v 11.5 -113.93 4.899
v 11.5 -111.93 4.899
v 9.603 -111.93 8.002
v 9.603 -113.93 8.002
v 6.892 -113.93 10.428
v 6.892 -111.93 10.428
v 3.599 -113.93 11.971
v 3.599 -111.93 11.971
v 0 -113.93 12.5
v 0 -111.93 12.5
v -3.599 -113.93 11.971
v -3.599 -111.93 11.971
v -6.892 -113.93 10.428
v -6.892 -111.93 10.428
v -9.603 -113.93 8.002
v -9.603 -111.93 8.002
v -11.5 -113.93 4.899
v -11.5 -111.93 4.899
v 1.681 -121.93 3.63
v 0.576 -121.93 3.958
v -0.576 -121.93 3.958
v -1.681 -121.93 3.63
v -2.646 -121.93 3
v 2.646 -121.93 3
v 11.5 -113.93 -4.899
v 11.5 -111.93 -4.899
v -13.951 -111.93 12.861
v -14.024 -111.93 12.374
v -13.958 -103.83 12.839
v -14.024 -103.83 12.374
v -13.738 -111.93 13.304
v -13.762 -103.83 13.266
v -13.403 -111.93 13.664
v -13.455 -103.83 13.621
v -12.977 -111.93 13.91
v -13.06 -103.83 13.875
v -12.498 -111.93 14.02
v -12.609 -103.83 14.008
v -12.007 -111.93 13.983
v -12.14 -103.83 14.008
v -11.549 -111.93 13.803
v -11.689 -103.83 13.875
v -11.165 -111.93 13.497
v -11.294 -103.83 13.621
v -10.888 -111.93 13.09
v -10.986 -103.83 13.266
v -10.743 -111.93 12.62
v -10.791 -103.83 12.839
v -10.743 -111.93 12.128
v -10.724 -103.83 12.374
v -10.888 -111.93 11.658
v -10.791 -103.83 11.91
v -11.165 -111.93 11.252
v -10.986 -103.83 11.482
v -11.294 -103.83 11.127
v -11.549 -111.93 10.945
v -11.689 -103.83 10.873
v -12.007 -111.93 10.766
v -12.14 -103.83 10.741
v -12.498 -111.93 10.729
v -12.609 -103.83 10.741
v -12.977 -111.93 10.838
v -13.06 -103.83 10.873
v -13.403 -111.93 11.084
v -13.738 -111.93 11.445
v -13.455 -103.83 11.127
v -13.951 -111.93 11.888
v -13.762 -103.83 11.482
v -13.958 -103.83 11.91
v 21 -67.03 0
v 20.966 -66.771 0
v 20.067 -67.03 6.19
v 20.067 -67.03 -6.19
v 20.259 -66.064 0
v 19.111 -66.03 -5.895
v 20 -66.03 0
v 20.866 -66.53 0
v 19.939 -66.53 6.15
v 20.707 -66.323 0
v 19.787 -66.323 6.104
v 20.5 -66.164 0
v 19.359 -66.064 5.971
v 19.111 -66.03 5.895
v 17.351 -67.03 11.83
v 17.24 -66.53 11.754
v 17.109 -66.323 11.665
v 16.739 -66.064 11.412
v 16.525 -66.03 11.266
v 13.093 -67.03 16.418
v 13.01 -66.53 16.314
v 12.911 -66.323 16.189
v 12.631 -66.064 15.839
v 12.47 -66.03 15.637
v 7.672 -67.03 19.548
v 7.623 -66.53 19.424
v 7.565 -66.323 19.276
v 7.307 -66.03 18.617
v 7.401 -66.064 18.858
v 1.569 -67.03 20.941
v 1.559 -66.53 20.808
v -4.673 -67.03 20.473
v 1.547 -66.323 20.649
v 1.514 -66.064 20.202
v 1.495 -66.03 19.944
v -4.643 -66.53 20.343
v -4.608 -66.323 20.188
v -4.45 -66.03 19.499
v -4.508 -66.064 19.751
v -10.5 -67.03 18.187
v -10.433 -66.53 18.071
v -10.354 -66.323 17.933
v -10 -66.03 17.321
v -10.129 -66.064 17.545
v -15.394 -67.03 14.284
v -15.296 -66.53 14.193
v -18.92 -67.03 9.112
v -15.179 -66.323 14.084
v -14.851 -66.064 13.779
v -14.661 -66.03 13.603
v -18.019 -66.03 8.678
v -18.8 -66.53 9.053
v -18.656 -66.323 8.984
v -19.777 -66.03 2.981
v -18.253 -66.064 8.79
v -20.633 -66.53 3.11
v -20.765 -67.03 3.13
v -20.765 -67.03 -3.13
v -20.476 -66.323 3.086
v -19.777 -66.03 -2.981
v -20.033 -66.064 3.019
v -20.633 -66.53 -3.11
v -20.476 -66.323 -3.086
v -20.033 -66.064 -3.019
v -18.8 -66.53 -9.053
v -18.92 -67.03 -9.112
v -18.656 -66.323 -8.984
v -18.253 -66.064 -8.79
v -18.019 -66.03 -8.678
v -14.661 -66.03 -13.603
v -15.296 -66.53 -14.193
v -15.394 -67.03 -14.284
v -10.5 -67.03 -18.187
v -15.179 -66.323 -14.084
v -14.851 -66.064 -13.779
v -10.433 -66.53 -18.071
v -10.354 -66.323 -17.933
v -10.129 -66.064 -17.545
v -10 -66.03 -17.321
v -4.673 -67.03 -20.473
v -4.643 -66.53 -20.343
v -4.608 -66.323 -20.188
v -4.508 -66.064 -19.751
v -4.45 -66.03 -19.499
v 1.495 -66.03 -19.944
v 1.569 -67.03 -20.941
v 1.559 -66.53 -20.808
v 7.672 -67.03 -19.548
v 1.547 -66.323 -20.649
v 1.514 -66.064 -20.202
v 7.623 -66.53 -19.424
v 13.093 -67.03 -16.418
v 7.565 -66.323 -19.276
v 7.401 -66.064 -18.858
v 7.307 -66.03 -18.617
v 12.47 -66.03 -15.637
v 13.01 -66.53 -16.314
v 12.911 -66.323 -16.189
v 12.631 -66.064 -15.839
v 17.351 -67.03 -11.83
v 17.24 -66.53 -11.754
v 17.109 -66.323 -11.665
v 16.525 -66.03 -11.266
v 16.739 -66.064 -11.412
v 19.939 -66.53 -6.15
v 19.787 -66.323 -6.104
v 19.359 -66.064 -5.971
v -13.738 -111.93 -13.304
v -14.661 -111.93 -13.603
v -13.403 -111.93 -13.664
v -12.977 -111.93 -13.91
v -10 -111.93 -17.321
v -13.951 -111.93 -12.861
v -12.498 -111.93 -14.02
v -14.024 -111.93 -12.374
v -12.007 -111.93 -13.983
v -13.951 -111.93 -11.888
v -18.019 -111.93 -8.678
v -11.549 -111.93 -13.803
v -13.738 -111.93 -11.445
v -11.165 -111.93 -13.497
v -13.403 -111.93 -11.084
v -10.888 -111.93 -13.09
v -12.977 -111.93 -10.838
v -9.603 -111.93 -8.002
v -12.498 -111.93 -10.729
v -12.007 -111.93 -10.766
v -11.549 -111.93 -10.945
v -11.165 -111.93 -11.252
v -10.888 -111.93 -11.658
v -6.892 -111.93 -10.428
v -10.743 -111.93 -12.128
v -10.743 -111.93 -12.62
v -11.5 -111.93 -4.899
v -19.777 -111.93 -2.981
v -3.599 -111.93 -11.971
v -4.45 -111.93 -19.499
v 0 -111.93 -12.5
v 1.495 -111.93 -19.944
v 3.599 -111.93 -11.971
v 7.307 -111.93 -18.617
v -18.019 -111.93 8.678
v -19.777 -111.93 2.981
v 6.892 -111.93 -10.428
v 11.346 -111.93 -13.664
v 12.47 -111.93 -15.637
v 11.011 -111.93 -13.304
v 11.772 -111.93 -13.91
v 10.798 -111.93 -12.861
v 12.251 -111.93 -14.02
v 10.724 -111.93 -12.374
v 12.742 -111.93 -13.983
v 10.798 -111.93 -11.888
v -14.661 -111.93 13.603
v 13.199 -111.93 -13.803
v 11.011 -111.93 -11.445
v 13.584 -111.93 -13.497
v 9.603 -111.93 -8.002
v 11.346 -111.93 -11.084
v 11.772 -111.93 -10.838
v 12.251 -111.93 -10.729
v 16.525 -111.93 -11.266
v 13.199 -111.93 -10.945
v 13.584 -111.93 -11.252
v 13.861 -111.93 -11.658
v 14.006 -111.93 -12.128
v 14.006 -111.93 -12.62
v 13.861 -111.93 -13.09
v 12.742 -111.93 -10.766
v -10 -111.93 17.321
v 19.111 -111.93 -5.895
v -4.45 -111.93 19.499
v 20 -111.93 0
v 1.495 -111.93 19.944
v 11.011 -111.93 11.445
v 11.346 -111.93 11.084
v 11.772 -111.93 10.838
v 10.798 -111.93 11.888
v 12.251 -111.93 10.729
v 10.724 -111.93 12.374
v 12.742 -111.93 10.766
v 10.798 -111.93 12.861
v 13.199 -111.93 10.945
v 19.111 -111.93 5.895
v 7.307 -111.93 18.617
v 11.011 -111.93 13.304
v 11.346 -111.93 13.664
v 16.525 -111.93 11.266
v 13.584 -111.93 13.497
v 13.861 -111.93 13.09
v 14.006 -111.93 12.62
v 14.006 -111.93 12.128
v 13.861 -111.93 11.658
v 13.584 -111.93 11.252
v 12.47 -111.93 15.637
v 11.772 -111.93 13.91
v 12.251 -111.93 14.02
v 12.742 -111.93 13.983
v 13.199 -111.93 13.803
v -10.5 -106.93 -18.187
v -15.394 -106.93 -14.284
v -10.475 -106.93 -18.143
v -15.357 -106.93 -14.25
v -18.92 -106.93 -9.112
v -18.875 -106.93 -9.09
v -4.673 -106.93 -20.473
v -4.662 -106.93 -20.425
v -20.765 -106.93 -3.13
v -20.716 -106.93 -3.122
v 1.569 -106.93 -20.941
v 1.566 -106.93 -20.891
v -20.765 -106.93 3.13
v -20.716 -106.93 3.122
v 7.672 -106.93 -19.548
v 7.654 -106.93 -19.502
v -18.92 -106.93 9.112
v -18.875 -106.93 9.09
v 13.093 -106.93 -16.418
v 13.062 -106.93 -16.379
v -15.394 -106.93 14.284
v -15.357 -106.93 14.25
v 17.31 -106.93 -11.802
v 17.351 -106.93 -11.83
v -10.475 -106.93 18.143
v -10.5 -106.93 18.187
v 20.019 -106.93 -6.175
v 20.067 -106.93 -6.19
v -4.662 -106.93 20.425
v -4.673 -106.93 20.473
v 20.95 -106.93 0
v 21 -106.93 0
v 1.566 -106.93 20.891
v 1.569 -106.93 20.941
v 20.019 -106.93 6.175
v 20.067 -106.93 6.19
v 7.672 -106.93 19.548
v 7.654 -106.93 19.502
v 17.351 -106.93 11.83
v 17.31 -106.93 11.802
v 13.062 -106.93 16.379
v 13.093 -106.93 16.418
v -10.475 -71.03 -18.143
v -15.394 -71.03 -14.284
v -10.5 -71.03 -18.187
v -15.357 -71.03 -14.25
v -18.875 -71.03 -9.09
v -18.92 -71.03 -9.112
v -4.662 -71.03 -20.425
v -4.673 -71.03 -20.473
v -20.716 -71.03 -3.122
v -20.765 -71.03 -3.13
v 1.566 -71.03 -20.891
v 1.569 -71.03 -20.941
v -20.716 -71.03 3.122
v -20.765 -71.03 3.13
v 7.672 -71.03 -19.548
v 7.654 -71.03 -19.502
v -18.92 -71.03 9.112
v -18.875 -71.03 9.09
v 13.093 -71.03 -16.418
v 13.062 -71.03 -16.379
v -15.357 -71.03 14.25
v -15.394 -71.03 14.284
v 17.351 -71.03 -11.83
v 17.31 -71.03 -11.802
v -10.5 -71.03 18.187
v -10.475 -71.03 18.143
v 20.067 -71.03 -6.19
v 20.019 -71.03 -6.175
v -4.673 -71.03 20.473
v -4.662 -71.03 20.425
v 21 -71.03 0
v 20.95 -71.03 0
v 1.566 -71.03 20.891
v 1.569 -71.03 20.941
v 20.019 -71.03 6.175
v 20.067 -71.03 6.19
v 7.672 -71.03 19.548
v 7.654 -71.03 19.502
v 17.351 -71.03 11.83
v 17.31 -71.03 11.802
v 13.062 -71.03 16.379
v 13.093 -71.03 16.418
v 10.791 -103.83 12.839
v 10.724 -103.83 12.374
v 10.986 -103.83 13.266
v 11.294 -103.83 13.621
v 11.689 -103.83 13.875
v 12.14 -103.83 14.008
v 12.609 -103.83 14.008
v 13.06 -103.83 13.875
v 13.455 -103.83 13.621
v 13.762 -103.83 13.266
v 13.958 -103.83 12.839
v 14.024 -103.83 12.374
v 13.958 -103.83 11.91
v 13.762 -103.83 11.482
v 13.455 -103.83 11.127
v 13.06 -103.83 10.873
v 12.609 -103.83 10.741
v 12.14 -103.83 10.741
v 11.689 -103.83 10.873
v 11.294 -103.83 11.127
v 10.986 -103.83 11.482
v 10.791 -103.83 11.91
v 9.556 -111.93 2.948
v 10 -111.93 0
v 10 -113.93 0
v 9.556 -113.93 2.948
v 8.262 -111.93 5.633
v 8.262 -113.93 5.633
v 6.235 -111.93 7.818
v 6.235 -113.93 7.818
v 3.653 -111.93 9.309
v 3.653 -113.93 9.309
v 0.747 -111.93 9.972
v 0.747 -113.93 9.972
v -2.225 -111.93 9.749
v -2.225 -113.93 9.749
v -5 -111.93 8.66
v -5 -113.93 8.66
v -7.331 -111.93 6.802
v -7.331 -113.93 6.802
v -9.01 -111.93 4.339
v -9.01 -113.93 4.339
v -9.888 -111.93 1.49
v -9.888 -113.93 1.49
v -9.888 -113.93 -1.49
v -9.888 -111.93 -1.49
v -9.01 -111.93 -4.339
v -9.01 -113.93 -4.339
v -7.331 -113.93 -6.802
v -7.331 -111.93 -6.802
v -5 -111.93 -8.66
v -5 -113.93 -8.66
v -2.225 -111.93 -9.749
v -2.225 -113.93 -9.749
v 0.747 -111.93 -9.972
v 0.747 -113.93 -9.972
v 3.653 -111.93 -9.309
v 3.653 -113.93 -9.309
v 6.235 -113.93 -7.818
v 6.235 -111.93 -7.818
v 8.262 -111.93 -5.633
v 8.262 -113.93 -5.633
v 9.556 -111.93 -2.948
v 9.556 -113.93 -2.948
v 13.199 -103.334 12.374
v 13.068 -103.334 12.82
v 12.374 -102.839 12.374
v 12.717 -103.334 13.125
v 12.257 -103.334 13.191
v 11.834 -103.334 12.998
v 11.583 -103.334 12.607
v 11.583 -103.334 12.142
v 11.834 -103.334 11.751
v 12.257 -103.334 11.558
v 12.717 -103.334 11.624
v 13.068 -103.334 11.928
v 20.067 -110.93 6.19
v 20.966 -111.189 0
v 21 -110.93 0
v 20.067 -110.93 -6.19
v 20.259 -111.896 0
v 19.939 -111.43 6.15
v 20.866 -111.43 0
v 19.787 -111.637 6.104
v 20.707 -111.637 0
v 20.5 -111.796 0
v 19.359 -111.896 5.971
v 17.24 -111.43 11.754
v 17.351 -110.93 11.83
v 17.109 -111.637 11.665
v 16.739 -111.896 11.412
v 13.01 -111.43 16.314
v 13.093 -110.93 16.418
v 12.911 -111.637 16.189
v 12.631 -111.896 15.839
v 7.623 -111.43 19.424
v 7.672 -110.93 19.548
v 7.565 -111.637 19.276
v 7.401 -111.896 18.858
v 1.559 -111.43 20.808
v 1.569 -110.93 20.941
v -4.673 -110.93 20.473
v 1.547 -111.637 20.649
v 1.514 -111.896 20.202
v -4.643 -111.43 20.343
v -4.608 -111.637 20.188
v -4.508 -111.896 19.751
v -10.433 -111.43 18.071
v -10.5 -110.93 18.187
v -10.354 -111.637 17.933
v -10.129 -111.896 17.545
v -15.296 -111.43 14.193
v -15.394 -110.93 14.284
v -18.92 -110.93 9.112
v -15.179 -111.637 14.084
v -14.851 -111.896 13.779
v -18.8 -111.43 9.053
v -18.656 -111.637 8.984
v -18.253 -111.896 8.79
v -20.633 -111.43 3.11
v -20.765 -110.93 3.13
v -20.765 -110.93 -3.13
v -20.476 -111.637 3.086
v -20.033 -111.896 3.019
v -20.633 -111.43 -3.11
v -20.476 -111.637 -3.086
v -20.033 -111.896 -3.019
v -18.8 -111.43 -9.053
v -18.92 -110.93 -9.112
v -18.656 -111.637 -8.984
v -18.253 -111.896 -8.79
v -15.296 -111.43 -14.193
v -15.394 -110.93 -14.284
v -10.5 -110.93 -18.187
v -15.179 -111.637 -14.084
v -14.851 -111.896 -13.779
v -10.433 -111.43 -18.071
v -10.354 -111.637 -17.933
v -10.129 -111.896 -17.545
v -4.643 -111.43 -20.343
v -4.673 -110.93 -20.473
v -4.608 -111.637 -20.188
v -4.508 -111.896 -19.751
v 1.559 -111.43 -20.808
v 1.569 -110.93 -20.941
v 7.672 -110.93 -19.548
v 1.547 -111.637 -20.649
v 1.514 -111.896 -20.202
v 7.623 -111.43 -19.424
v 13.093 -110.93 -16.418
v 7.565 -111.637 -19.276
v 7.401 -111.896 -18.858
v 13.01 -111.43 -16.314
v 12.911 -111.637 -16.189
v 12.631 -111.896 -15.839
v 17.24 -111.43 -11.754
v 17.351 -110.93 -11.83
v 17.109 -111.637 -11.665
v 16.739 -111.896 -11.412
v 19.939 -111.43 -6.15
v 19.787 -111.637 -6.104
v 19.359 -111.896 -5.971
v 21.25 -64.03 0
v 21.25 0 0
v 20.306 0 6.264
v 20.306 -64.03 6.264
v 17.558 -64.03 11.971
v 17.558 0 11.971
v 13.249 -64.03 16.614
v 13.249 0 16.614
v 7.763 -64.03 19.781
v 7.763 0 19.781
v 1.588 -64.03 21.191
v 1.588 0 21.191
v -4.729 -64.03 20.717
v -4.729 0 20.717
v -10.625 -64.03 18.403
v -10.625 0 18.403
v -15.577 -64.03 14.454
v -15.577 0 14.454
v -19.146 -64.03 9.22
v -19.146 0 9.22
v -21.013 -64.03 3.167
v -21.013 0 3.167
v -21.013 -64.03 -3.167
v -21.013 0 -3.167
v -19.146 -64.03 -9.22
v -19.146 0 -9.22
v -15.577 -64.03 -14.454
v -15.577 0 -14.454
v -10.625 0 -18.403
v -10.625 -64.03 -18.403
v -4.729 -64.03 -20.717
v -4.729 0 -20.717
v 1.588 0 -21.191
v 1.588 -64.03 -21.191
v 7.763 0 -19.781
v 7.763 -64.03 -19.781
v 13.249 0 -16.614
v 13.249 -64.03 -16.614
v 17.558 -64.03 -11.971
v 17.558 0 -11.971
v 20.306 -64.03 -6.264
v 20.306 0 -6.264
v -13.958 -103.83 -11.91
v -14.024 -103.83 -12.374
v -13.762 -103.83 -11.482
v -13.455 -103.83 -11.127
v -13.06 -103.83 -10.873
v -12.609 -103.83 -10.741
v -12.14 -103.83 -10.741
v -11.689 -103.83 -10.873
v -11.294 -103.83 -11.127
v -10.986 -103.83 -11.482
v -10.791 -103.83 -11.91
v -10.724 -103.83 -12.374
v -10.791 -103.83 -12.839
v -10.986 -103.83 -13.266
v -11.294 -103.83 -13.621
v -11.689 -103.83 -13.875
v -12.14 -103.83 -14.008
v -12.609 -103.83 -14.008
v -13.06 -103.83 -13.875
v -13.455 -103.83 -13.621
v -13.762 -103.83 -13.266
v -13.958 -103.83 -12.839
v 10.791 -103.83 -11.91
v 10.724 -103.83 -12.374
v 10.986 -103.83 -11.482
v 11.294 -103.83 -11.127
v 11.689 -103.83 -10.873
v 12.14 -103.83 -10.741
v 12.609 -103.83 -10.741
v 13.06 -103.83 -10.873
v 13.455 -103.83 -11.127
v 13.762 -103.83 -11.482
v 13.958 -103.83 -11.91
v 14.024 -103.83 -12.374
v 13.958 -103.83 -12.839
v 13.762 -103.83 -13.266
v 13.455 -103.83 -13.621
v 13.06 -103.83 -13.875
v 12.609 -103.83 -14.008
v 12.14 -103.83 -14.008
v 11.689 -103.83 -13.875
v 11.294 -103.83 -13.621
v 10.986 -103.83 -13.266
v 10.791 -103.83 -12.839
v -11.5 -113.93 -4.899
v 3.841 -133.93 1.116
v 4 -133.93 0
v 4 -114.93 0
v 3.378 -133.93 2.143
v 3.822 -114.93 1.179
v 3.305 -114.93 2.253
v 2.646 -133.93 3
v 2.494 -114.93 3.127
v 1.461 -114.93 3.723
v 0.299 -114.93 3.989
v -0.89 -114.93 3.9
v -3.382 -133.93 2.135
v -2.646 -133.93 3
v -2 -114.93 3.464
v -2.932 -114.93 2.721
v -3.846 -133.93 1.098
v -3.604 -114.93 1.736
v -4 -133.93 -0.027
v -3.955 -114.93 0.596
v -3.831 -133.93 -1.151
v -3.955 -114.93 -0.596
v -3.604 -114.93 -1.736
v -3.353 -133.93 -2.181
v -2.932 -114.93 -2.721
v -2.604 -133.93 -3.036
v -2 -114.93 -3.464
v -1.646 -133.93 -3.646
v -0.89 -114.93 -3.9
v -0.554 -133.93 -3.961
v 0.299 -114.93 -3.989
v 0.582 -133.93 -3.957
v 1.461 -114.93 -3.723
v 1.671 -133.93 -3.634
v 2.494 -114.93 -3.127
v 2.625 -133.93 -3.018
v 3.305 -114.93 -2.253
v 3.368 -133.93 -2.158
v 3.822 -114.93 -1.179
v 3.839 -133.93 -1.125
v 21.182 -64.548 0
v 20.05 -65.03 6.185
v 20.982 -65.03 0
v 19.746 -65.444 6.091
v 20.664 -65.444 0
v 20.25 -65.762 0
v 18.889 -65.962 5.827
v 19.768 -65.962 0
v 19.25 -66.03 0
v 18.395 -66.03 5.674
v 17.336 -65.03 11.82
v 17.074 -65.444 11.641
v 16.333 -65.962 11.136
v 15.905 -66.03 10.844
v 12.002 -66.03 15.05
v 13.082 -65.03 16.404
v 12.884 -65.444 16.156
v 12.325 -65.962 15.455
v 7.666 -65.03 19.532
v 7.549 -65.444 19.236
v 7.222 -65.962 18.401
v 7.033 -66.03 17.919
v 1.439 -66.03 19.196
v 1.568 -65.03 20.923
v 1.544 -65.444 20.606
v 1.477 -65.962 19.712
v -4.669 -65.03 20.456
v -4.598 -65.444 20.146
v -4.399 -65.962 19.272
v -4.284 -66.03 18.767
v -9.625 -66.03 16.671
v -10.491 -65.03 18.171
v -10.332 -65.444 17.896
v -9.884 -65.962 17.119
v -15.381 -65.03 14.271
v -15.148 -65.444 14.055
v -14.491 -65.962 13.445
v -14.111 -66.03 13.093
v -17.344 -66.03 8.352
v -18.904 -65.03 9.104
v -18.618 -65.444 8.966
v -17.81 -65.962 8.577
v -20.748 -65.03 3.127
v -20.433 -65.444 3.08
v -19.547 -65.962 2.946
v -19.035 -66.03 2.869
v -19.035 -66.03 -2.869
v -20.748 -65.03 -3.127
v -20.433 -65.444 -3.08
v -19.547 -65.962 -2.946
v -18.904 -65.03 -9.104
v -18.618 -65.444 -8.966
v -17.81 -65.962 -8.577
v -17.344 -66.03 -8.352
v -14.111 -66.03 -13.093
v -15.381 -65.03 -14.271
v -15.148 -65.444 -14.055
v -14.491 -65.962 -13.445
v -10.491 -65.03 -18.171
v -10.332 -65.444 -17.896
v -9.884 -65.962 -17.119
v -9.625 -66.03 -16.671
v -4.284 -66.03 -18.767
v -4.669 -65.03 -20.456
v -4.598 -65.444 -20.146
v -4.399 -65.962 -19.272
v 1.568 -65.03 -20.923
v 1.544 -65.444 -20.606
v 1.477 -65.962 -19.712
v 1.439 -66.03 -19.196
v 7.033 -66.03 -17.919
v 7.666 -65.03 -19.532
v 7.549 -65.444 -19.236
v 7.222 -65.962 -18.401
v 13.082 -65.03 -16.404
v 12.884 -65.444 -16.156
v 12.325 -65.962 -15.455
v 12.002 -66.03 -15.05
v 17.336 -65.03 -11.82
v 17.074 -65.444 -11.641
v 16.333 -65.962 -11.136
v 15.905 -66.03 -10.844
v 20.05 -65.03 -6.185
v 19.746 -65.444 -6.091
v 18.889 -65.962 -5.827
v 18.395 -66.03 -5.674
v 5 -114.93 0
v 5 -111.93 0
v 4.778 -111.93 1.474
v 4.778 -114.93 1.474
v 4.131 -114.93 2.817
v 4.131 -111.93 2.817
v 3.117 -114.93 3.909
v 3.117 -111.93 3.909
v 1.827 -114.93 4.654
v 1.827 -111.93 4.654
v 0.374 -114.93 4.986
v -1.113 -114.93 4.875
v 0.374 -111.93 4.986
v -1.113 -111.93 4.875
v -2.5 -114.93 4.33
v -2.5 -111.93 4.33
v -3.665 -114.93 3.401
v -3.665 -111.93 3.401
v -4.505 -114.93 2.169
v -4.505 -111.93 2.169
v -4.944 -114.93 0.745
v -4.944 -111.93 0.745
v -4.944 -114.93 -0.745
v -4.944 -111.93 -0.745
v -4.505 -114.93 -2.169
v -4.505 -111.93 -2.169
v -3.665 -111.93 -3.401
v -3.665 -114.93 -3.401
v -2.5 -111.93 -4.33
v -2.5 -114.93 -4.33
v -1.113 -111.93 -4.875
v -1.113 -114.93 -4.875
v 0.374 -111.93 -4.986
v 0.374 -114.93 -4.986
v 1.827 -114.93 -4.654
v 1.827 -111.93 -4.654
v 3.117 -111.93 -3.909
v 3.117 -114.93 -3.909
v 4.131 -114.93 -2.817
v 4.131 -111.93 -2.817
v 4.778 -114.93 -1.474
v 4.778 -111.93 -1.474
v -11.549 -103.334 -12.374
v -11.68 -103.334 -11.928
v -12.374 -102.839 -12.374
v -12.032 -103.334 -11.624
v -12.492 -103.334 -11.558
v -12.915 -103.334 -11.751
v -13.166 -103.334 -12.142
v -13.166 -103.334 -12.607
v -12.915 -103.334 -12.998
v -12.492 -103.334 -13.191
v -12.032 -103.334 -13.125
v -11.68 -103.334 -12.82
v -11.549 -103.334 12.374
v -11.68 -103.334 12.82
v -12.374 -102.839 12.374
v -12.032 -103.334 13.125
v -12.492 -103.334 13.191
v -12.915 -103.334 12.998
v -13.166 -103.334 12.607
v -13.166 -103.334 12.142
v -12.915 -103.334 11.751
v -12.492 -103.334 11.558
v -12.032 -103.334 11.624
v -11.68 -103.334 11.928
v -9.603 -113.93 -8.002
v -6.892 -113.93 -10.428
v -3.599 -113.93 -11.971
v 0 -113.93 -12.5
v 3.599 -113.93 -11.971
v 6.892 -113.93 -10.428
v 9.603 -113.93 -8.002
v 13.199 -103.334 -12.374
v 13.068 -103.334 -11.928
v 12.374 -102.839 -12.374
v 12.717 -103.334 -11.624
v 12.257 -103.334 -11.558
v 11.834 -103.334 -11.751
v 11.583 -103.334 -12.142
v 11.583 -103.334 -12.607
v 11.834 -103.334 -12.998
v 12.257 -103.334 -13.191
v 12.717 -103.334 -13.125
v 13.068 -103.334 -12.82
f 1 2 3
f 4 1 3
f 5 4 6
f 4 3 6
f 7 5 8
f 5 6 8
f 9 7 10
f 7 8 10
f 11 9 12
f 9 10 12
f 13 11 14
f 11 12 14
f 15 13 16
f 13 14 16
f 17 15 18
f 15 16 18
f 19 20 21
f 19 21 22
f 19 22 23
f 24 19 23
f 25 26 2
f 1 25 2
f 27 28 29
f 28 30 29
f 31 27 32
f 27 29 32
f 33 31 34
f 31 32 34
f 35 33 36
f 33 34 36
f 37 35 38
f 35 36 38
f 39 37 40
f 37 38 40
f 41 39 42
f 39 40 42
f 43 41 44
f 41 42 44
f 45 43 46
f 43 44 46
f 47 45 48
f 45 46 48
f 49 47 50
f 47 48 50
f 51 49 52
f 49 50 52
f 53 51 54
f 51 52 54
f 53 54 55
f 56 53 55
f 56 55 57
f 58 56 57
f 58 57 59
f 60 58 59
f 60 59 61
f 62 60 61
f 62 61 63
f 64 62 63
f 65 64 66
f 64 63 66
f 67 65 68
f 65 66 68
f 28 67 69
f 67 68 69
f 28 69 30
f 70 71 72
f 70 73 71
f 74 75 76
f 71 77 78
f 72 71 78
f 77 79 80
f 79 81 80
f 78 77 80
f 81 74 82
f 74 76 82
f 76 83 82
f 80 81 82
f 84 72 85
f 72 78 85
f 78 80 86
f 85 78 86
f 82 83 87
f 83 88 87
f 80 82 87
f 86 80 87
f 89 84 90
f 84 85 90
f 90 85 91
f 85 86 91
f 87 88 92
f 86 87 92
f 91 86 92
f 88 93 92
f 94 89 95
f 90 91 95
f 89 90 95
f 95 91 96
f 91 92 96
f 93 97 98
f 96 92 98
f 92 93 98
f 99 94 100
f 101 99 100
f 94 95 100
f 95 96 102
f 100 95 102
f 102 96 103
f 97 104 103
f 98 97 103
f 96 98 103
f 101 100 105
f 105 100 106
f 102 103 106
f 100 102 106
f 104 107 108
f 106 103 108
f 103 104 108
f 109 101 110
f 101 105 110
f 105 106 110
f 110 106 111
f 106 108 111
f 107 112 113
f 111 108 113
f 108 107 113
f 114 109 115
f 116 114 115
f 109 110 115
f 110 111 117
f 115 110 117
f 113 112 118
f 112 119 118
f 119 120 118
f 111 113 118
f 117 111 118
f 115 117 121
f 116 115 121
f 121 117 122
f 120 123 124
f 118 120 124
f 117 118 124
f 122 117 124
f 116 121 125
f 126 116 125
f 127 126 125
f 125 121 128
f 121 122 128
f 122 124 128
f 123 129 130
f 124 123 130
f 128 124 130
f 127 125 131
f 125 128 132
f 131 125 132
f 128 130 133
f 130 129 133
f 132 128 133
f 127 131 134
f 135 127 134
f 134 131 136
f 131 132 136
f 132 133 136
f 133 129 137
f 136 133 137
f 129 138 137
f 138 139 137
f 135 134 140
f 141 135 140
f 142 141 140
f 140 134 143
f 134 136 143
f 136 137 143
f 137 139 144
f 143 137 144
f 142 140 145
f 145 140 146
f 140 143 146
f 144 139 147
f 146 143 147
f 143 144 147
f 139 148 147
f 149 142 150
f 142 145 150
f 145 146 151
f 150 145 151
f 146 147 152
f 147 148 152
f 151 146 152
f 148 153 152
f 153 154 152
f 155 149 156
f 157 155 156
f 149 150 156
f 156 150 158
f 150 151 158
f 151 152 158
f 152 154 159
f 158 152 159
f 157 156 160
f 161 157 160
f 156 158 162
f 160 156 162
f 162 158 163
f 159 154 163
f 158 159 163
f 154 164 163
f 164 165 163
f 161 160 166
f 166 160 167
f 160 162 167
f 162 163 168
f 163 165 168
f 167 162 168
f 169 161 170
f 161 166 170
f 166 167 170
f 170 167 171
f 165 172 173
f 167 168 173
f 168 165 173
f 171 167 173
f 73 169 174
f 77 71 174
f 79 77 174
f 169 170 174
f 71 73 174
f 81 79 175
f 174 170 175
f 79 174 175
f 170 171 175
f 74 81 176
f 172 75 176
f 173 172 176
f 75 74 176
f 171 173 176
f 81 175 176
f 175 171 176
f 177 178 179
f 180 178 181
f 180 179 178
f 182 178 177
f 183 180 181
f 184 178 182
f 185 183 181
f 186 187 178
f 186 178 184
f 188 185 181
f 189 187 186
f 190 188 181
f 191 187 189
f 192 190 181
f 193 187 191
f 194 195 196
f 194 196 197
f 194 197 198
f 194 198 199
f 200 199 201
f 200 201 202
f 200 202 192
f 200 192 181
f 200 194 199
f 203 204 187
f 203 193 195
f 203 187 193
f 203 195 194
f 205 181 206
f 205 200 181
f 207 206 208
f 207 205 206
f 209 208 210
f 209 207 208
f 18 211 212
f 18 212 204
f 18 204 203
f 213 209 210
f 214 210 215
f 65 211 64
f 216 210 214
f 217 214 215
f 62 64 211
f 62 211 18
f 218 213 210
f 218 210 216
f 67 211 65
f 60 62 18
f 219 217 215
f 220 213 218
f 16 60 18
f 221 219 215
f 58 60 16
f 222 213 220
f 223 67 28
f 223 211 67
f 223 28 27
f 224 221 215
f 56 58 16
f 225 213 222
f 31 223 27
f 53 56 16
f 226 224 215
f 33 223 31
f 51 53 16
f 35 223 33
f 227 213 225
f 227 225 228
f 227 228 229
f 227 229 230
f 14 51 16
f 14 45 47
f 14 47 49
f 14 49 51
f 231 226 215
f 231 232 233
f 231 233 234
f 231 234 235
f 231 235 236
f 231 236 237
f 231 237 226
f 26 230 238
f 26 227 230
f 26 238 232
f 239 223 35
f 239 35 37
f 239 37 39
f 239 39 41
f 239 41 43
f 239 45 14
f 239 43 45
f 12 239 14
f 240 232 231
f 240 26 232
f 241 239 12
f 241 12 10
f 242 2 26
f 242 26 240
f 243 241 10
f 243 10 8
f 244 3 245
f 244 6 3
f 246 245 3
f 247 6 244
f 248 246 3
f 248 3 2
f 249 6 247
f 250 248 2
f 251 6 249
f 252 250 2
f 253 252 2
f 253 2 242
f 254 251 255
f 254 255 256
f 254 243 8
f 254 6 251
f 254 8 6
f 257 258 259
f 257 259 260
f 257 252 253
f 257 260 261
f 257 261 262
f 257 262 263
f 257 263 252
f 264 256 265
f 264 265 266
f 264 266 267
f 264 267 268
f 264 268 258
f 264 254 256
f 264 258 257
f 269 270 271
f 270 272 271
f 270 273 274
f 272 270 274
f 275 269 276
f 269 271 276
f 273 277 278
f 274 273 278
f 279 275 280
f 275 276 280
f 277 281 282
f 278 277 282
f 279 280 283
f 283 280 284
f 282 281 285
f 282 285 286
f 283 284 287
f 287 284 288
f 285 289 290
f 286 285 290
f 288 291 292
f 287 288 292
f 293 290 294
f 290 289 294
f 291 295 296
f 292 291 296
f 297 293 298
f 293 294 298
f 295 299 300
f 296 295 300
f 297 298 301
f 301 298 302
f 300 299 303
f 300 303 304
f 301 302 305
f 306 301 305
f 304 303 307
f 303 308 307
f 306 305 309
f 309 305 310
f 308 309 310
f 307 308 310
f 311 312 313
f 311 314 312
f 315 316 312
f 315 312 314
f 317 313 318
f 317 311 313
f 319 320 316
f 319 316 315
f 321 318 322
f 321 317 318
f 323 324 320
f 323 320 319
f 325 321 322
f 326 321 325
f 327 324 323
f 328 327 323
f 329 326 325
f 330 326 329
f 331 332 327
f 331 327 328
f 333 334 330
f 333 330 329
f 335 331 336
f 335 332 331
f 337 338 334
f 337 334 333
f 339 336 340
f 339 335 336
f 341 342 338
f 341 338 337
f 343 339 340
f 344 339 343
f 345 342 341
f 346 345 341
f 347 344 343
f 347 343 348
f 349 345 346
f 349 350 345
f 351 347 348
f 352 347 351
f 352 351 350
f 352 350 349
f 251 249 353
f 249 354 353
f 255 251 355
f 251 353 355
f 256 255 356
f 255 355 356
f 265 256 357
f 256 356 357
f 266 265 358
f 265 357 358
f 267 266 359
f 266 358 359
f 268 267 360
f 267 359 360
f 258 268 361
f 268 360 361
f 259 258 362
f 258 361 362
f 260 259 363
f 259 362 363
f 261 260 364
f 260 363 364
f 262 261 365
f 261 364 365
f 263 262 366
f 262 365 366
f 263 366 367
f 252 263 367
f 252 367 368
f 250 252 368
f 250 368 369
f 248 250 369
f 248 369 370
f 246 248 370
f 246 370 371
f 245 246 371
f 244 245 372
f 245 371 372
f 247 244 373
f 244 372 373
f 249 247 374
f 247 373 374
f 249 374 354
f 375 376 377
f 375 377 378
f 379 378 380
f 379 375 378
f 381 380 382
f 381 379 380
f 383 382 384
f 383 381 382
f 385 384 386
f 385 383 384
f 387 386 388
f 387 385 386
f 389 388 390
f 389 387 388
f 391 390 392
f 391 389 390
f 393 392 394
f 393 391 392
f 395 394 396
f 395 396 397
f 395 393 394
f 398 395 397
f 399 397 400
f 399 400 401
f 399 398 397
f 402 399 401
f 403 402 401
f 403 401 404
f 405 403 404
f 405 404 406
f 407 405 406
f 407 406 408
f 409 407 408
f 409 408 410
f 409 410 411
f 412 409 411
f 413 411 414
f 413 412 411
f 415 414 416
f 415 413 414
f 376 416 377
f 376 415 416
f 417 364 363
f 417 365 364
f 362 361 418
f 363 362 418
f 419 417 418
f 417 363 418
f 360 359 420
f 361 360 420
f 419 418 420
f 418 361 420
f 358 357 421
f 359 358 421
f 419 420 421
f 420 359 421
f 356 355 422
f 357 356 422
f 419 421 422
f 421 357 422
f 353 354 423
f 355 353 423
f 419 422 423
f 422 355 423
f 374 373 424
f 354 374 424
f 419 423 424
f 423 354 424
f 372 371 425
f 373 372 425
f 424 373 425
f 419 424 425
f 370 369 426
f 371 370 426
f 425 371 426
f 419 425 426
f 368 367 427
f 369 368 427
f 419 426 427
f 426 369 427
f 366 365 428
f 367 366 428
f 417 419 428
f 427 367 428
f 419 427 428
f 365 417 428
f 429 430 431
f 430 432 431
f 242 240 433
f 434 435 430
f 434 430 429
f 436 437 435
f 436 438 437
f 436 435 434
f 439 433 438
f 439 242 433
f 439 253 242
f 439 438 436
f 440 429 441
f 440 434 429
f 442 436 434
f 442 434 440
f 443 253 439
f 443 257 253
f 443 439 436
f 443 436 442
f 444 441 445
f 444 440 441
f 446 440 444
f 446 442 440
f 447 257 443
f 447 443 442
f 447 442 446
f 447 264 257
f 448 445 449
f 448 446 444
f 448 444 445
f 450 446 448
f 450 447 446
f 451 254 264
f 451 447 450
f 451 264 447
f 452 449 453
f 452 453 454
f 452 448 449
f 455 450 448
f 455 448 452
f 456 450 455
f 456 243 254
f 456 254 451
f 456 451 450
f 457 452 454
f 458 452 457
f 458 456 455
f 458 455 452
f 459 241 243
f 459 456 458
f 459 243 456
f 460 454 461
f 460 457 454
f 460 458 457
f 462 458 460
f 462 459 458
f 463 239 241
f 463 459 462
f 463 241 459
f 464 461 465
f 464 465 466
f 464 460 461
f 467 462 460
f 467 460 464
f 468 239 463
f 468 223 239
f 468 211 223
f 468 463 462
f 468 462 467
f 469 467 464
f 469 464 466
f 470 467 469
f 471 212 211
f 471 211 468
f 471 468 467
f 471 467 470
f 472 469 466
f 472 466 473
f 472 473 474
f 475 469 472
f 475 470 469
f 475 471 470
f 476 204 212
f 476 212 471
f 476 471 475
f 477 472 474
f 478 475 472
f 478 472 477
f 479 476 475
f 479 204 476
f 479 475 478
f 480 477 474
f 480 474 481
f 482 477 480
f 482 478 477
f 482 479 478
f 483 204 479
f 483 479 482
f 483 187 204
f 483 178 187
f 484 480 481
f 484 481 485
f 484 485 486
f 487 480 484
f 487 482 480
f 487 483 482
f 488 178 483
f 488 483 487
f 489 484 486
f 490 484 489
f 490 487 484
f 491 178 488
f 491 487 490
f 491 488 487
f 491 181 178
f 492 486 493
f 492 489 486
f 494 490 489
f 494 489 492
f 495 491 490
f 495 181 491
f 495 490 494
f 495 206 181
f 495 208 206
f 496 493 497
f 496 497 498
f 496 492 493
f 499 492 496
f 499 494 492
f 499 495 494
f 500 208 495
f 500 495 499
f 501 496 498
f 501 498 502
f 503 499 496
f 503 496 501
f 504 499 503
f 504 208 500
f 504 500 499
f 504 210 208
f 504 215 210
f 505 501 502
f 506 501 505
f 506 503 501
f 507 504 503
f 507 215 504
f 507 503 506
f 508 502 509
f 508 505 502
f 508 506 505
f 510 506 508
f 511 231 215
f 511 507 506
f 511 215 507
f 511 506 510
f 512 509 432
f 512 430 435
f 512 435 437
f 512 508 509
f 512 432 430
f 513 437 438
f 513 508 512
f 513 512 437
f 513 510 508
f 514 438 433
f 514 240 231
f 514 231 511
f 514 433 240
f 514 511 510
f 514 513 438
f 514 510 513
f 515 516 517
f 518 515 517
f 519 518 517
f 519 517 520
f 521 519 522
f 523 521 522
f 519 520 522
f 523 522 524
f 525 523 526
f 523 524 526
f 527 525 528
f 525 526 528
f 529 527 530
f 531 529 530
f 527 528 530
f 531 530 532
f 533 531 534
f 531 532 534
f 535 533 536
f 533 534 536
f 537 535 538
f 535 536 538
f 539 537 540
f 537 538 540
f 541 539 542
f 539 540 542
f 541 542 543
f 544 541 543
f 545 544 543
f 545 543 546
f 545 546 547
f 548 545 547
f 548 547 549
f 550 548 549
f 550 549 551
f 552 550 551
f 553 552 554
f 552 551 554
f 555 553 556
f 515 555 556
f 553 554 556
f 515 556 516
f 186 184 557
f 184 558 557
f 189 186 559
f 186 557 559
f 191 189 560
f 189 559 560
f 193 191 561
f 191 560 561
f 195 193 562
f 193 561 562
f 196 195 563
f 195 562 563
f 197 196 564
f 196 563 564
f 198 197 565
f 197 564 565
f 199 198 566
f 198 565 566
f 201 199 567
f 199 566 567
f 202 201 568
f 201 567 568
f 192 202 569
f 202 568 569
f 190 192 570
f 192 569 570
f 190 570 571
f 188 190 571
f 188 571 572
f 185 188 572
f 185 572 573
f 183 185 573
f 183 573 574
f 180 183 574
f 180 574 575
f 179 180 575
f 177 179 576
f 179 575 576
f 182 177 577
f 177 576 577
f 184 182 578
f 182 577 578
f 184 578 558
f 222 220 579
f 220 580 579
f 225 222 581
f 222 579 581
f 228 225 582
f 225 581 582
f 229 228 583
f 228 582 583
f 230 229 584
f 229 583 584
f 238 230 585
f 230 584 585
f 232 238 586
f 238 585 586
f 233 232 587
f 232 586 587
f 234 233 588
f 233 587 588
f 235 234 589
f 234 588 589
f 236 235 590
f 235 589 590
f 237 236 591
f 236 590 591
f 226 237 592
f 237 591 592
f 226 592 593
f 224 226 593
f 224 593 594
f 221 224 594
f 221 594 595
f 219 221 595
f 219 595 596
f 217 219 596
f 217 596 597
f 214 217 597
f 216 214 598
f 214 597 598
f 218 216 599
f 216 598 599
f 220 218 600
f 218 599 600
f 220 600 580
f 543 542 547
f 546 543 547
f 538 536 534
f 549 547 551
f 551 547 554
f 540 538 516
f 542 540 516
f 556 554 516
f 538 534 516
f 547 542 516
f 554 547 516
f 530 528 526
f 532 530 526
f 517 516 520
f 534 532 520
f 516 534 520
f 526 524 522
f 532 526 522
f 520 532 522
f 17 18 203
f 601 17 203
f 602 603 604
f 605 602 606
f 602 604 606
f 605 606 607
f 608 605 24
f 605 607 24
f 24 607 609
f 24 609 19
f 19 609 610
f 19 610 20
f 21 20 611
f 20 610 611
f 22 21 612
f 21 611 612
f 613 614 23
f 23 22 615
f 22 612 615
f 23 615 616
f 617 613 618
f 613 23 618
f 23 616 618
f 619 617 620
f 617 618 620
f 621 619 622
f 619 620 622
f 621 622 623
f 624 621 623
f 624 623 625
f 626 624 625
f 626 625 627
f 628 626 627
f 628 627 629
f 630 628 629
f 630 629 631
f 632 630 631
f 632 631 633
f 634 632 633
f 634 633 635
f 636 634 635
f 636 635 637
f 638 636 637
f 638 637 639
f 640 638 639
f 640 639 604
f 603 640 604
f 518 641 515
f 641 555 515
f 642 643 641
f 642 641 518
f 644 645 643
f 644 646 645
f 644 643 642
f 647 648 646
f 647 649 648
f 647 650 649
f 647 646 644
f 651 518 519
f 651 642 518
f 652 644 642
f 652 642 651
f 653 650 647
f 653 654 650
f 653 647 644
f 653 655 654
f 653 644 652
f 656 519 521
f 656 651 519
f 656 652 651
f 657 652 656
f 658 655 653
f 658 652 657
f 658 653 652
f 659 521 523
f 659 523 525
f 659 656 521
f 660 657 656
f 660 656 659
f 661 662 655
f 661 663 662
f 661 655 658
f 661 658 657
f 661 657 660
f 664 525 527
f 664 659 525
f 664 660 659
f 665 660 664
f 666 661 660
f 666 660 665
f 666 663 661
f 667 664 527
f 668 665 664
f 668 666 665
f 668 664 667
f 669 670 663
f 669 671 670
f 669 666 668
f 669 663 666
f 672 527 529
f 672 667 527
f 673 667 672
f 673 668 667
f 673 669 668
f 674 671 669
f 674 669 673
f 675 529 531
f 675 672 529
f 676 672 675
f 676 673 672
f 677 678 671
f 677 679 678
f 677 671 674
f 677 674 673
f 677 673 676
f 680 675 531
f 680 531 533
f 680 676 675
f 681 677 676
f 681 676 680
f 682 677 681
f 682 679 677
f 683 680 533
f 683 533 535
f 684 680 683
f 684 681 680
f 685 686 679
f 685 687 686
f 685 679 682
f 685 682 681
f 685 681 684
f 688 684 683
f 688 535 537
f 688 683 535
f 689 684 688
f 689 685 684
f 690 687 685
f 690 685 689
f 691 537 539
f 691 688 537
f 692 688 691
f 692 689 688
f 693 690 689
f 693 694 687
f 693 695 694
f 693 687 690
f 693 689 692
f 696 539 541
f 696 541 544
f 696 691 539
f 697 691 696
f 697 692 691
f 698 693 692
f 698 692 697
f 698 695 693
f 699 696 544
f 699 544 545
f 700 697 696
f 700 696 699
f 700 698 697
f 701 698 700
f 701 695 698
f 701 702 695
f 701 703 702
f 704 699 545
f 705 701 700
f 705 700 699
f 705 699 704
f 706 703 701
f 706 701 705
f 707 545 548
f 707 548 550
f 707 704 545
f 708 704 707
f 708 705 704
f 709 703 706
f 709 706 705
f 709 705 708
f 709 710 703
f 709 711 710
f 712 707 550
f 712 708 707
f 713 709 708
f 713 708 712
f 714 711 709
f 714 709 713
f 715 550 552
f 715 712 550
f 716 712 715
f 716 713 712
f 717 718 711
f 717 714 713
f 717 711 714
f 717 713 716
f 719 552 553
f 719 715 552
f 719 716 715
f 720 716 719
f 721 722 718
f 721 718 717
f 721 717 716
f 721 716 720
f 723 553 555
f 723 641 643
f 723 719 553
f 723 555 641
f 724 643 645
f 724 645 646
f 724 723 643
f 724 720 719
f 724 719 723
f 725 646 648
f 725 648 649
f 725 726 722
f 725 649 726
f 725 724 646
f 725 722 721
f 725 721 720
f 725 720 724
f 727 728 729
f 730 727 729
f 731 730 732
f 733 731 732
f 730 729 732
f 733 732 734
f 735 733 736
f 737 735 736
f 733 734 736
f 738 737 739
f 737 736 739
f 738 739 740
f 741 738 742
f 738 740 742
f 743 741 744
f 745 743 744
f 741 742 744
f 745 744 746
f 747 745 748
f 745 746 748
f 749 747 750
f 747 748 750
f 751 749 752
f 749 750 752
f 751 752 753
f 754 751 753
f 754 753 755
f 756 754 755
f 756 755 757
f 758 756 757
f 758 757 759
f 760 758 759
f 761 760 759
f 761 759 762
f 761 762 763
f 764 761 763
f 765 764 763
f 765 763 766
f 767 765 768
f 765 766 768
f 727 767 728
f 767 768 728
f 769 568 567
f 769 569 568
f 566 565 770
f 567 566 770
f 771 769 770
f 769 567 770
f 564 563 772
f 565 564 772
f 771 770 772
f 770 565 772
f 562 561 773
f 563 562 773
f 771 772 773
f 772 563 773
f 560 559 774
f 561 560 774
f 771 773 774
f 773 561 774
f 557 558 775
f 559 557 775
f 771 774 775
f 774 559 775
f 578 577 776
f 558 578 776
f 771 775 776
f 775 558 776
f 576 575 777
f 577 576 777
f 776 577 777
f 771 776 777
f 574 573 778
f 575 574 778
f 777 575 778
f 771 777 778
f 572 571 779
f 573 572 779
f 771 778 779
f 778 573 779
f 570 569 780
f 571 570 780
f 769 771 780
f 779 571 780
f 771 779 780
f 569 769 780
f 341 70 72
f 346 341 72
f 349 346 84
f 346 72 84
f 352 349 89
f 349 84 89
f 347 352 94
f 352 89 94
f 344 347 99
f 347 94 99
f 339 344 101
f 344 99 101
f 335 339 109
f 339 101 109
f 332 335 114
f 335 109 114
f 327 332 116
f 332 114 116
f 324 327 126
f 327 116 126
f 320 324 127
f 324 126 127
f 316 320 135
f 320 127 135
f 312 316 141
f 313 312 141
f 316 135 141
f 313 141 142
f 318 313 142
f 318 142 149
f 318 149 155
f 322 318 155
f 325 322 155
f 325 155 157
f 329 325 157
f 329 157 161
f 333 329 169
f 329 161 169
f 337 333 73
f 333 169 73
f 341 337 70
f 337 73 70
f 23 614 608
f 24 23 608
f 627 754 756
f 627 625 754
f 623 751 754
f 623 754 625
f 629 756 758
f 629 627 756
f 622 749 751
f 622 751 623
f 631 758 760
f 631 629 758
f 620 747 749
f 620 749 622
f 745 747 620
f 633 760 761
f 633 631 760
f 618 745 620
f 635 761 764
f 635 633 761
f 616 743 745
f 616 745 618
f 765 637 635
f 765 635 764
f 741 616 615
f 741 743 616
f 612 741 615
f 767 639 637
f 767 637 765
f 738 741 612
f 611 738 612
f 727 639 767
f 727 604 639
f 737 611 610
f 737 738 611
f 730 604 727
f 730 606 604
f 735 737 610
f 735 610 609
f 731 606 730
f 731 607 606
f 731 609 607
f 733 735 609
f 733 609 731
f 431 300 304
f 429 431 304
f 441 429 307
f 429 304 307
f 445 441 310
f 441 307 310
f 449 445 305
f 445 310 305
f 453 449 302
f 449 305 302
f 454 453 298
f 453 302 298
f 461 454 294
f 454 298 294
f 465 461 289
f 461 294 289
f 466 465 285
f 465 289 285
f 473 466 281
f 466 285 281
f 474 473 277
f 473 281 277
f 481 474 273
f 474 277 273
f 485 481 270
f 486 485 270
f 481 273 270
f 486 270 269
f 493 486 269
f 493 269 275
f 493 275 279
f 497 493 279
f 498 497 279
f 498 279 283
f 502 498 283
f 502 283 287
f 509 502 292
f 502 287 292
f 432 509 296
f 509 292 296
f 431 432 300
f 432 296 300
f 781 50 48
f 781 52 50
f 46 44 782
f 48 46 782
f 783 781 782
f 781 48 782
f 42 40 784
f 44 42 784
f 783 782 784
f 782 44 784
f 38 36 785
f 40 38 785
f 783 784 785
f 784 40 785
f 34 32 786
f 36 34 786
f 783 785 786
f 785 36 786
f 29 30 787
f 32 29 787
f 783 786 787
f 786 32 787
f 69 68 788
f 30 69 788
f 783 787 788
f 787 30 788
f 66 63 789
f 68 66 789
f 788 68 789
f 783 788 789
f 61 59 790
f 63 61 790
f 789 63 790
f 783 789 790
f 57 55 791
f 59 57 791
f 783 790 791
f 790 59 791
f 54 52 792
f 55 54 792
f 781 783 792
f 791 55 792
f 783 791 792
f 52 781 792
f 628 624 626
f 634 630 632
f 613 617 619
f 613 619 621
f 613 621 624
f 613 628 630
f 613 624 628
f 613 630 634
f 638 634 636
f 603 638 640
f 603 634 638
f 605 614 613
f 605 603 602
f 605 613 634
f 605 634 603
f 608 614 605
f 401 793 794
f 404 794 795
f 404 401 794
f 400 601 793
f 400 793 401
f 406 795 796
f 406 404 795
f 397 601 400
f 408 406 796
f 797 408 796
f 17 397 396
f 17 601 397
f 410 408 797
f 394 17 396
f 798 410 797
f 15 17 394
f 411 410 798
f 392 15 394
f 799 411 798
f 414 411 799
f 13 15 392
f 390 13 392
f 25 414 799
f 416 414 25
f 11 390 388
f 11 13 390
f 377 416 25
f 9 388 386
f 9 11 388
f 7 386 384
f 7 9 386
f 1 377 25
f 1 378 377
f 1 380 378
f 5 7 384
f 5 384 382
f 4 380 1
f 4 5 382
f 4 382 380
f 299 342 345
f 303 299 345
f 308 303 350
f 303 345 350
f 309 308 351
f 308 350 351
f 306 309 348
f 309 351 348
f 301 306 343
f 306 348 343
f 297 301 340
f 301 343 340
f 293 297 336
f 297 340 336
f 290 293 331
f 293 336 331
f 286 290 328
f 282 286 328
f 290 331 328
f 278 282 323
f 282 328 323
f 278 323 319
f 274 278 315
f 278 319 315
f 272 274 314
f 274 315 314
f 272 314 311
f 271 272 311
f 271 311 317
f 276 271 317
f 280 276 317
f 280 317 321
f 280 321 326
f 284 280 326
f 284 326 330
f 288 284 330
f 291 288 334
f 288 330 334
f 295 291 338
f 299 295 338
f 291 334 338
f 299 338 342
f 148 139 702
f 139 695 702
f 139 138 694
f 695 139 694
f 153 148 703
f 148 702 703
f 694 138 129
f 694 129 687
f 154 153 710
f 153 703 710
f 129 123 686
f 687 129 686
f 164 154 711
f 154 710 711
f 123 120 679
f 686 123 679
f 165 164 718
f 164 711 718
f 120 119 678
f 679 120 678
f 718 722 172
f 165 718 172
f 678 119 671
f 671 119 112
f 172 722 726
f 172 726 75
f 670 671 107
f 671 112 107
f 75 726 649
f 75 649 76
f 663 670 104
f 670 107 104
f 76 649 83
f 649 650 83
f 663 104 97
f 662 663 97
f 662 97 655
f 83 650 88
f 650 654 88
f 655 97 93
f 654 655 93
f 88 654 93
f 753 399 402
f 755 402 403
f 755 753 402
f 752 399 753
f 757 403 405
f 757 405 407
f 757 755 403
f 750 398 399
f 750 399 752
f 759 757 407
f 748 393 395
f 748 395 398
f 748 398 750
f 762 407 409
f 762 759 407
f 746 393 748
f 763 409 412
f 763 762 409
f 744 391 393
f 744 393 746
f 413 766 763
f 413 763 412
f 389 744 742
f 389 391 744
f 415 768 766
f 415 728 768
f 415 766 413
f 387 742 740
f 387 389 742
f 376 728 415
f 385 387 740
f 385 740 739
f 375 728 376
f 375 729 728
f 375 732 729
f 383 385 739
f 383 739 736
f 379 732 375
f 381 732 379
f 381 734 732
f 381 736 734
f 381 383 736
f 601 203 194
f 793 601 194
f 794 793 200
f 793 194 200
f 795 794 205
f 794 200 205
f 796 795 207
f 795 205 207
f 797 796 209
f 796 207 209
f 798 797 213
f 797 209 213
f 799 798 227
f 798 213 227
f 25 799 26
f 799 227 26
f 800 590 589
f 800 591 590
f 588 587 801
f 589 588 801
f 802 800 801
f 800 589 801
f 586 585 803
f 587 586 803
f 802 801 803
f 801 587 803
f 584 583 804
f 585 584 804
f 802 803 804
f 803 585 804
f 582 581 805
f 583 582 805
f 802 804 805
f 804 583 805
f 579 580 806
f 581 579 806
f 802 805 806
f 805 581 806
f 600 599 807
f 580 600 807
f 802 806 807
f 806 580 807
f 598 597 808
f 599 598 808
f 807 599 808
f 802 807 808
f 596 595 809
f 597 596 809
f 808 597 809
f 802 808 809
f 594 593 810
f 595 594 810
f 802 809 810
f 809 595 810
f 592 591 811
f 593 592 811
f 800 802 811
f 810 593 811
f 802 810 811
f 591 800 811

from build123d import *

# Parameters (mm, degrees)
F0_R      = 21.25
F1_DEPTH  = 66.03
F2_R      = 2
F3_R      = 21
F3_R_2    = 19.25
F4_DEPTH  = 5
F5_R      = 20.95
F6_DEPTH  = 35.9
F7_R      = 21
F7_R_2    = 20.95
F8_DEPTH  = 5
F9_R      = 10
F10_DEPTH = 2
F11_R     = 5
F12_DEPTH = 3
F13_R     = 4
F14_DEPTH = 19
F16_DEPTH = 12
F18_D     = 3.3
F18_DEPTH = 8.1
F18_TIP   = 0.9914200214
F19_R     = 1


with BuildPart() as f1:
    # F0 (on Front) → F1 (new body)
    with BuildSketch(Plane.XZ):
        Circle(F0_R)
    extrude(amount=F1_DEPTH)

    # F2
    f2_edges = [f1.edges().sort_by_distance(p)[0] for p in [
        (-21.25, -66.03, 0),
    ]]
    fillet(f2_edges, radius=F2_R)

    # F3 (on face) → F4 (join)
    with BuildSketch(Plane.XZ.offset(66.03)):
        Circle(F3_R)
        Circle(F3_R_2, mode=Mode.SUBTRACT)
        Circle(F3_R_2)
    extrude(amount=F4_DEPTH)

    # F5 (on face) → F6 (join)
    with BuildSketch(Plane.XZ.offset(71.03)):
        Circle(F5_R)
    extrude(amount=F6_DEPTH)

    # F7 (on face) → F8 (join)
    with BuildSketch(Plane.XZ.offset(106.93)):
        Circle(F7_R)
        Circle(F7_R_2, mode=Mode.SUBTRACT)
        Circle(F7_R_2)
    extrude(amount=F8_DEPTH)

    # F9 (on face) → F10 (join)
    with BuildSketch(Plane.XZ.offset(111.93)):
        with BuildLine():
            Line((11.5, -4.8989794856), (11.5, 4.8989794856))
            ThreePointArc((11.5, 4.8989794856), (0, 12.5), (-11.5, 4.8989794856))
            Line((-11.5, 4.8989794856), (-11.5, -4.8989794856))
            ThreePointArc((-11.5, -4.8989794856), (0, -12.5), (11.5, -4.8989794856))
        make_face()
        Circle(F9_R, mode=Mode.SUBTRACT)
    extrude(amount=F10_DEPTH)

    # F11 (on face) → F12 (join)
    with BuildSketch(Plane.XZ.offset(111.93)):
        Circle(F11_R)
    extrude(amount=F12_DEPTH)

    # F13 (on face) → F14 (join)
    with BuildSketch(Plane.XZ.offset(114.93)):
        Circle(F13_R)
    extrude(amount=F14_DEPTH)

    # F15 (on face) → F16 (cut)
    with BuildSketch(Plane.XZ.offset(133.93)):
        with BuildLine():
            Line((-2.6457513111, 3), (2.6457513111, 3))
            ThreePointArc((2.6457513111, 3), (0, 4), (-2.6457513111, 3))
        make_face()
    extrude(amount=-F16_DEPTH, mode=Mode.SUBTRACT)

    # F18
    with Locations(Plane.XZ.offset(111.93)):
        with Locations((-12.3743686708, 12.3743686708), (12.3743686708, 12.3743686708), (12.3743686708, -12.3743686708), (-12.3743686708, -12.3743686708)):
            Hole(F18_D / 2, depth=F18_DEPTH)
            with Locations((0, 0, -(F18_DEPTH + F18_TIP / 2))):  # 118° drill point
                Cone(0, F18_D / 2, F18_TIP, mode=Mode.SUBTRACT)

    # F19
    f19_edges = [f1.edges().sort_by_distance(p)[0] for p in [
        (-21, -66.03, 0),
        (-21, -111.93, 0),
    ]]
    fillet(f19_edges, radius=F19_R)


solid = f1.part
